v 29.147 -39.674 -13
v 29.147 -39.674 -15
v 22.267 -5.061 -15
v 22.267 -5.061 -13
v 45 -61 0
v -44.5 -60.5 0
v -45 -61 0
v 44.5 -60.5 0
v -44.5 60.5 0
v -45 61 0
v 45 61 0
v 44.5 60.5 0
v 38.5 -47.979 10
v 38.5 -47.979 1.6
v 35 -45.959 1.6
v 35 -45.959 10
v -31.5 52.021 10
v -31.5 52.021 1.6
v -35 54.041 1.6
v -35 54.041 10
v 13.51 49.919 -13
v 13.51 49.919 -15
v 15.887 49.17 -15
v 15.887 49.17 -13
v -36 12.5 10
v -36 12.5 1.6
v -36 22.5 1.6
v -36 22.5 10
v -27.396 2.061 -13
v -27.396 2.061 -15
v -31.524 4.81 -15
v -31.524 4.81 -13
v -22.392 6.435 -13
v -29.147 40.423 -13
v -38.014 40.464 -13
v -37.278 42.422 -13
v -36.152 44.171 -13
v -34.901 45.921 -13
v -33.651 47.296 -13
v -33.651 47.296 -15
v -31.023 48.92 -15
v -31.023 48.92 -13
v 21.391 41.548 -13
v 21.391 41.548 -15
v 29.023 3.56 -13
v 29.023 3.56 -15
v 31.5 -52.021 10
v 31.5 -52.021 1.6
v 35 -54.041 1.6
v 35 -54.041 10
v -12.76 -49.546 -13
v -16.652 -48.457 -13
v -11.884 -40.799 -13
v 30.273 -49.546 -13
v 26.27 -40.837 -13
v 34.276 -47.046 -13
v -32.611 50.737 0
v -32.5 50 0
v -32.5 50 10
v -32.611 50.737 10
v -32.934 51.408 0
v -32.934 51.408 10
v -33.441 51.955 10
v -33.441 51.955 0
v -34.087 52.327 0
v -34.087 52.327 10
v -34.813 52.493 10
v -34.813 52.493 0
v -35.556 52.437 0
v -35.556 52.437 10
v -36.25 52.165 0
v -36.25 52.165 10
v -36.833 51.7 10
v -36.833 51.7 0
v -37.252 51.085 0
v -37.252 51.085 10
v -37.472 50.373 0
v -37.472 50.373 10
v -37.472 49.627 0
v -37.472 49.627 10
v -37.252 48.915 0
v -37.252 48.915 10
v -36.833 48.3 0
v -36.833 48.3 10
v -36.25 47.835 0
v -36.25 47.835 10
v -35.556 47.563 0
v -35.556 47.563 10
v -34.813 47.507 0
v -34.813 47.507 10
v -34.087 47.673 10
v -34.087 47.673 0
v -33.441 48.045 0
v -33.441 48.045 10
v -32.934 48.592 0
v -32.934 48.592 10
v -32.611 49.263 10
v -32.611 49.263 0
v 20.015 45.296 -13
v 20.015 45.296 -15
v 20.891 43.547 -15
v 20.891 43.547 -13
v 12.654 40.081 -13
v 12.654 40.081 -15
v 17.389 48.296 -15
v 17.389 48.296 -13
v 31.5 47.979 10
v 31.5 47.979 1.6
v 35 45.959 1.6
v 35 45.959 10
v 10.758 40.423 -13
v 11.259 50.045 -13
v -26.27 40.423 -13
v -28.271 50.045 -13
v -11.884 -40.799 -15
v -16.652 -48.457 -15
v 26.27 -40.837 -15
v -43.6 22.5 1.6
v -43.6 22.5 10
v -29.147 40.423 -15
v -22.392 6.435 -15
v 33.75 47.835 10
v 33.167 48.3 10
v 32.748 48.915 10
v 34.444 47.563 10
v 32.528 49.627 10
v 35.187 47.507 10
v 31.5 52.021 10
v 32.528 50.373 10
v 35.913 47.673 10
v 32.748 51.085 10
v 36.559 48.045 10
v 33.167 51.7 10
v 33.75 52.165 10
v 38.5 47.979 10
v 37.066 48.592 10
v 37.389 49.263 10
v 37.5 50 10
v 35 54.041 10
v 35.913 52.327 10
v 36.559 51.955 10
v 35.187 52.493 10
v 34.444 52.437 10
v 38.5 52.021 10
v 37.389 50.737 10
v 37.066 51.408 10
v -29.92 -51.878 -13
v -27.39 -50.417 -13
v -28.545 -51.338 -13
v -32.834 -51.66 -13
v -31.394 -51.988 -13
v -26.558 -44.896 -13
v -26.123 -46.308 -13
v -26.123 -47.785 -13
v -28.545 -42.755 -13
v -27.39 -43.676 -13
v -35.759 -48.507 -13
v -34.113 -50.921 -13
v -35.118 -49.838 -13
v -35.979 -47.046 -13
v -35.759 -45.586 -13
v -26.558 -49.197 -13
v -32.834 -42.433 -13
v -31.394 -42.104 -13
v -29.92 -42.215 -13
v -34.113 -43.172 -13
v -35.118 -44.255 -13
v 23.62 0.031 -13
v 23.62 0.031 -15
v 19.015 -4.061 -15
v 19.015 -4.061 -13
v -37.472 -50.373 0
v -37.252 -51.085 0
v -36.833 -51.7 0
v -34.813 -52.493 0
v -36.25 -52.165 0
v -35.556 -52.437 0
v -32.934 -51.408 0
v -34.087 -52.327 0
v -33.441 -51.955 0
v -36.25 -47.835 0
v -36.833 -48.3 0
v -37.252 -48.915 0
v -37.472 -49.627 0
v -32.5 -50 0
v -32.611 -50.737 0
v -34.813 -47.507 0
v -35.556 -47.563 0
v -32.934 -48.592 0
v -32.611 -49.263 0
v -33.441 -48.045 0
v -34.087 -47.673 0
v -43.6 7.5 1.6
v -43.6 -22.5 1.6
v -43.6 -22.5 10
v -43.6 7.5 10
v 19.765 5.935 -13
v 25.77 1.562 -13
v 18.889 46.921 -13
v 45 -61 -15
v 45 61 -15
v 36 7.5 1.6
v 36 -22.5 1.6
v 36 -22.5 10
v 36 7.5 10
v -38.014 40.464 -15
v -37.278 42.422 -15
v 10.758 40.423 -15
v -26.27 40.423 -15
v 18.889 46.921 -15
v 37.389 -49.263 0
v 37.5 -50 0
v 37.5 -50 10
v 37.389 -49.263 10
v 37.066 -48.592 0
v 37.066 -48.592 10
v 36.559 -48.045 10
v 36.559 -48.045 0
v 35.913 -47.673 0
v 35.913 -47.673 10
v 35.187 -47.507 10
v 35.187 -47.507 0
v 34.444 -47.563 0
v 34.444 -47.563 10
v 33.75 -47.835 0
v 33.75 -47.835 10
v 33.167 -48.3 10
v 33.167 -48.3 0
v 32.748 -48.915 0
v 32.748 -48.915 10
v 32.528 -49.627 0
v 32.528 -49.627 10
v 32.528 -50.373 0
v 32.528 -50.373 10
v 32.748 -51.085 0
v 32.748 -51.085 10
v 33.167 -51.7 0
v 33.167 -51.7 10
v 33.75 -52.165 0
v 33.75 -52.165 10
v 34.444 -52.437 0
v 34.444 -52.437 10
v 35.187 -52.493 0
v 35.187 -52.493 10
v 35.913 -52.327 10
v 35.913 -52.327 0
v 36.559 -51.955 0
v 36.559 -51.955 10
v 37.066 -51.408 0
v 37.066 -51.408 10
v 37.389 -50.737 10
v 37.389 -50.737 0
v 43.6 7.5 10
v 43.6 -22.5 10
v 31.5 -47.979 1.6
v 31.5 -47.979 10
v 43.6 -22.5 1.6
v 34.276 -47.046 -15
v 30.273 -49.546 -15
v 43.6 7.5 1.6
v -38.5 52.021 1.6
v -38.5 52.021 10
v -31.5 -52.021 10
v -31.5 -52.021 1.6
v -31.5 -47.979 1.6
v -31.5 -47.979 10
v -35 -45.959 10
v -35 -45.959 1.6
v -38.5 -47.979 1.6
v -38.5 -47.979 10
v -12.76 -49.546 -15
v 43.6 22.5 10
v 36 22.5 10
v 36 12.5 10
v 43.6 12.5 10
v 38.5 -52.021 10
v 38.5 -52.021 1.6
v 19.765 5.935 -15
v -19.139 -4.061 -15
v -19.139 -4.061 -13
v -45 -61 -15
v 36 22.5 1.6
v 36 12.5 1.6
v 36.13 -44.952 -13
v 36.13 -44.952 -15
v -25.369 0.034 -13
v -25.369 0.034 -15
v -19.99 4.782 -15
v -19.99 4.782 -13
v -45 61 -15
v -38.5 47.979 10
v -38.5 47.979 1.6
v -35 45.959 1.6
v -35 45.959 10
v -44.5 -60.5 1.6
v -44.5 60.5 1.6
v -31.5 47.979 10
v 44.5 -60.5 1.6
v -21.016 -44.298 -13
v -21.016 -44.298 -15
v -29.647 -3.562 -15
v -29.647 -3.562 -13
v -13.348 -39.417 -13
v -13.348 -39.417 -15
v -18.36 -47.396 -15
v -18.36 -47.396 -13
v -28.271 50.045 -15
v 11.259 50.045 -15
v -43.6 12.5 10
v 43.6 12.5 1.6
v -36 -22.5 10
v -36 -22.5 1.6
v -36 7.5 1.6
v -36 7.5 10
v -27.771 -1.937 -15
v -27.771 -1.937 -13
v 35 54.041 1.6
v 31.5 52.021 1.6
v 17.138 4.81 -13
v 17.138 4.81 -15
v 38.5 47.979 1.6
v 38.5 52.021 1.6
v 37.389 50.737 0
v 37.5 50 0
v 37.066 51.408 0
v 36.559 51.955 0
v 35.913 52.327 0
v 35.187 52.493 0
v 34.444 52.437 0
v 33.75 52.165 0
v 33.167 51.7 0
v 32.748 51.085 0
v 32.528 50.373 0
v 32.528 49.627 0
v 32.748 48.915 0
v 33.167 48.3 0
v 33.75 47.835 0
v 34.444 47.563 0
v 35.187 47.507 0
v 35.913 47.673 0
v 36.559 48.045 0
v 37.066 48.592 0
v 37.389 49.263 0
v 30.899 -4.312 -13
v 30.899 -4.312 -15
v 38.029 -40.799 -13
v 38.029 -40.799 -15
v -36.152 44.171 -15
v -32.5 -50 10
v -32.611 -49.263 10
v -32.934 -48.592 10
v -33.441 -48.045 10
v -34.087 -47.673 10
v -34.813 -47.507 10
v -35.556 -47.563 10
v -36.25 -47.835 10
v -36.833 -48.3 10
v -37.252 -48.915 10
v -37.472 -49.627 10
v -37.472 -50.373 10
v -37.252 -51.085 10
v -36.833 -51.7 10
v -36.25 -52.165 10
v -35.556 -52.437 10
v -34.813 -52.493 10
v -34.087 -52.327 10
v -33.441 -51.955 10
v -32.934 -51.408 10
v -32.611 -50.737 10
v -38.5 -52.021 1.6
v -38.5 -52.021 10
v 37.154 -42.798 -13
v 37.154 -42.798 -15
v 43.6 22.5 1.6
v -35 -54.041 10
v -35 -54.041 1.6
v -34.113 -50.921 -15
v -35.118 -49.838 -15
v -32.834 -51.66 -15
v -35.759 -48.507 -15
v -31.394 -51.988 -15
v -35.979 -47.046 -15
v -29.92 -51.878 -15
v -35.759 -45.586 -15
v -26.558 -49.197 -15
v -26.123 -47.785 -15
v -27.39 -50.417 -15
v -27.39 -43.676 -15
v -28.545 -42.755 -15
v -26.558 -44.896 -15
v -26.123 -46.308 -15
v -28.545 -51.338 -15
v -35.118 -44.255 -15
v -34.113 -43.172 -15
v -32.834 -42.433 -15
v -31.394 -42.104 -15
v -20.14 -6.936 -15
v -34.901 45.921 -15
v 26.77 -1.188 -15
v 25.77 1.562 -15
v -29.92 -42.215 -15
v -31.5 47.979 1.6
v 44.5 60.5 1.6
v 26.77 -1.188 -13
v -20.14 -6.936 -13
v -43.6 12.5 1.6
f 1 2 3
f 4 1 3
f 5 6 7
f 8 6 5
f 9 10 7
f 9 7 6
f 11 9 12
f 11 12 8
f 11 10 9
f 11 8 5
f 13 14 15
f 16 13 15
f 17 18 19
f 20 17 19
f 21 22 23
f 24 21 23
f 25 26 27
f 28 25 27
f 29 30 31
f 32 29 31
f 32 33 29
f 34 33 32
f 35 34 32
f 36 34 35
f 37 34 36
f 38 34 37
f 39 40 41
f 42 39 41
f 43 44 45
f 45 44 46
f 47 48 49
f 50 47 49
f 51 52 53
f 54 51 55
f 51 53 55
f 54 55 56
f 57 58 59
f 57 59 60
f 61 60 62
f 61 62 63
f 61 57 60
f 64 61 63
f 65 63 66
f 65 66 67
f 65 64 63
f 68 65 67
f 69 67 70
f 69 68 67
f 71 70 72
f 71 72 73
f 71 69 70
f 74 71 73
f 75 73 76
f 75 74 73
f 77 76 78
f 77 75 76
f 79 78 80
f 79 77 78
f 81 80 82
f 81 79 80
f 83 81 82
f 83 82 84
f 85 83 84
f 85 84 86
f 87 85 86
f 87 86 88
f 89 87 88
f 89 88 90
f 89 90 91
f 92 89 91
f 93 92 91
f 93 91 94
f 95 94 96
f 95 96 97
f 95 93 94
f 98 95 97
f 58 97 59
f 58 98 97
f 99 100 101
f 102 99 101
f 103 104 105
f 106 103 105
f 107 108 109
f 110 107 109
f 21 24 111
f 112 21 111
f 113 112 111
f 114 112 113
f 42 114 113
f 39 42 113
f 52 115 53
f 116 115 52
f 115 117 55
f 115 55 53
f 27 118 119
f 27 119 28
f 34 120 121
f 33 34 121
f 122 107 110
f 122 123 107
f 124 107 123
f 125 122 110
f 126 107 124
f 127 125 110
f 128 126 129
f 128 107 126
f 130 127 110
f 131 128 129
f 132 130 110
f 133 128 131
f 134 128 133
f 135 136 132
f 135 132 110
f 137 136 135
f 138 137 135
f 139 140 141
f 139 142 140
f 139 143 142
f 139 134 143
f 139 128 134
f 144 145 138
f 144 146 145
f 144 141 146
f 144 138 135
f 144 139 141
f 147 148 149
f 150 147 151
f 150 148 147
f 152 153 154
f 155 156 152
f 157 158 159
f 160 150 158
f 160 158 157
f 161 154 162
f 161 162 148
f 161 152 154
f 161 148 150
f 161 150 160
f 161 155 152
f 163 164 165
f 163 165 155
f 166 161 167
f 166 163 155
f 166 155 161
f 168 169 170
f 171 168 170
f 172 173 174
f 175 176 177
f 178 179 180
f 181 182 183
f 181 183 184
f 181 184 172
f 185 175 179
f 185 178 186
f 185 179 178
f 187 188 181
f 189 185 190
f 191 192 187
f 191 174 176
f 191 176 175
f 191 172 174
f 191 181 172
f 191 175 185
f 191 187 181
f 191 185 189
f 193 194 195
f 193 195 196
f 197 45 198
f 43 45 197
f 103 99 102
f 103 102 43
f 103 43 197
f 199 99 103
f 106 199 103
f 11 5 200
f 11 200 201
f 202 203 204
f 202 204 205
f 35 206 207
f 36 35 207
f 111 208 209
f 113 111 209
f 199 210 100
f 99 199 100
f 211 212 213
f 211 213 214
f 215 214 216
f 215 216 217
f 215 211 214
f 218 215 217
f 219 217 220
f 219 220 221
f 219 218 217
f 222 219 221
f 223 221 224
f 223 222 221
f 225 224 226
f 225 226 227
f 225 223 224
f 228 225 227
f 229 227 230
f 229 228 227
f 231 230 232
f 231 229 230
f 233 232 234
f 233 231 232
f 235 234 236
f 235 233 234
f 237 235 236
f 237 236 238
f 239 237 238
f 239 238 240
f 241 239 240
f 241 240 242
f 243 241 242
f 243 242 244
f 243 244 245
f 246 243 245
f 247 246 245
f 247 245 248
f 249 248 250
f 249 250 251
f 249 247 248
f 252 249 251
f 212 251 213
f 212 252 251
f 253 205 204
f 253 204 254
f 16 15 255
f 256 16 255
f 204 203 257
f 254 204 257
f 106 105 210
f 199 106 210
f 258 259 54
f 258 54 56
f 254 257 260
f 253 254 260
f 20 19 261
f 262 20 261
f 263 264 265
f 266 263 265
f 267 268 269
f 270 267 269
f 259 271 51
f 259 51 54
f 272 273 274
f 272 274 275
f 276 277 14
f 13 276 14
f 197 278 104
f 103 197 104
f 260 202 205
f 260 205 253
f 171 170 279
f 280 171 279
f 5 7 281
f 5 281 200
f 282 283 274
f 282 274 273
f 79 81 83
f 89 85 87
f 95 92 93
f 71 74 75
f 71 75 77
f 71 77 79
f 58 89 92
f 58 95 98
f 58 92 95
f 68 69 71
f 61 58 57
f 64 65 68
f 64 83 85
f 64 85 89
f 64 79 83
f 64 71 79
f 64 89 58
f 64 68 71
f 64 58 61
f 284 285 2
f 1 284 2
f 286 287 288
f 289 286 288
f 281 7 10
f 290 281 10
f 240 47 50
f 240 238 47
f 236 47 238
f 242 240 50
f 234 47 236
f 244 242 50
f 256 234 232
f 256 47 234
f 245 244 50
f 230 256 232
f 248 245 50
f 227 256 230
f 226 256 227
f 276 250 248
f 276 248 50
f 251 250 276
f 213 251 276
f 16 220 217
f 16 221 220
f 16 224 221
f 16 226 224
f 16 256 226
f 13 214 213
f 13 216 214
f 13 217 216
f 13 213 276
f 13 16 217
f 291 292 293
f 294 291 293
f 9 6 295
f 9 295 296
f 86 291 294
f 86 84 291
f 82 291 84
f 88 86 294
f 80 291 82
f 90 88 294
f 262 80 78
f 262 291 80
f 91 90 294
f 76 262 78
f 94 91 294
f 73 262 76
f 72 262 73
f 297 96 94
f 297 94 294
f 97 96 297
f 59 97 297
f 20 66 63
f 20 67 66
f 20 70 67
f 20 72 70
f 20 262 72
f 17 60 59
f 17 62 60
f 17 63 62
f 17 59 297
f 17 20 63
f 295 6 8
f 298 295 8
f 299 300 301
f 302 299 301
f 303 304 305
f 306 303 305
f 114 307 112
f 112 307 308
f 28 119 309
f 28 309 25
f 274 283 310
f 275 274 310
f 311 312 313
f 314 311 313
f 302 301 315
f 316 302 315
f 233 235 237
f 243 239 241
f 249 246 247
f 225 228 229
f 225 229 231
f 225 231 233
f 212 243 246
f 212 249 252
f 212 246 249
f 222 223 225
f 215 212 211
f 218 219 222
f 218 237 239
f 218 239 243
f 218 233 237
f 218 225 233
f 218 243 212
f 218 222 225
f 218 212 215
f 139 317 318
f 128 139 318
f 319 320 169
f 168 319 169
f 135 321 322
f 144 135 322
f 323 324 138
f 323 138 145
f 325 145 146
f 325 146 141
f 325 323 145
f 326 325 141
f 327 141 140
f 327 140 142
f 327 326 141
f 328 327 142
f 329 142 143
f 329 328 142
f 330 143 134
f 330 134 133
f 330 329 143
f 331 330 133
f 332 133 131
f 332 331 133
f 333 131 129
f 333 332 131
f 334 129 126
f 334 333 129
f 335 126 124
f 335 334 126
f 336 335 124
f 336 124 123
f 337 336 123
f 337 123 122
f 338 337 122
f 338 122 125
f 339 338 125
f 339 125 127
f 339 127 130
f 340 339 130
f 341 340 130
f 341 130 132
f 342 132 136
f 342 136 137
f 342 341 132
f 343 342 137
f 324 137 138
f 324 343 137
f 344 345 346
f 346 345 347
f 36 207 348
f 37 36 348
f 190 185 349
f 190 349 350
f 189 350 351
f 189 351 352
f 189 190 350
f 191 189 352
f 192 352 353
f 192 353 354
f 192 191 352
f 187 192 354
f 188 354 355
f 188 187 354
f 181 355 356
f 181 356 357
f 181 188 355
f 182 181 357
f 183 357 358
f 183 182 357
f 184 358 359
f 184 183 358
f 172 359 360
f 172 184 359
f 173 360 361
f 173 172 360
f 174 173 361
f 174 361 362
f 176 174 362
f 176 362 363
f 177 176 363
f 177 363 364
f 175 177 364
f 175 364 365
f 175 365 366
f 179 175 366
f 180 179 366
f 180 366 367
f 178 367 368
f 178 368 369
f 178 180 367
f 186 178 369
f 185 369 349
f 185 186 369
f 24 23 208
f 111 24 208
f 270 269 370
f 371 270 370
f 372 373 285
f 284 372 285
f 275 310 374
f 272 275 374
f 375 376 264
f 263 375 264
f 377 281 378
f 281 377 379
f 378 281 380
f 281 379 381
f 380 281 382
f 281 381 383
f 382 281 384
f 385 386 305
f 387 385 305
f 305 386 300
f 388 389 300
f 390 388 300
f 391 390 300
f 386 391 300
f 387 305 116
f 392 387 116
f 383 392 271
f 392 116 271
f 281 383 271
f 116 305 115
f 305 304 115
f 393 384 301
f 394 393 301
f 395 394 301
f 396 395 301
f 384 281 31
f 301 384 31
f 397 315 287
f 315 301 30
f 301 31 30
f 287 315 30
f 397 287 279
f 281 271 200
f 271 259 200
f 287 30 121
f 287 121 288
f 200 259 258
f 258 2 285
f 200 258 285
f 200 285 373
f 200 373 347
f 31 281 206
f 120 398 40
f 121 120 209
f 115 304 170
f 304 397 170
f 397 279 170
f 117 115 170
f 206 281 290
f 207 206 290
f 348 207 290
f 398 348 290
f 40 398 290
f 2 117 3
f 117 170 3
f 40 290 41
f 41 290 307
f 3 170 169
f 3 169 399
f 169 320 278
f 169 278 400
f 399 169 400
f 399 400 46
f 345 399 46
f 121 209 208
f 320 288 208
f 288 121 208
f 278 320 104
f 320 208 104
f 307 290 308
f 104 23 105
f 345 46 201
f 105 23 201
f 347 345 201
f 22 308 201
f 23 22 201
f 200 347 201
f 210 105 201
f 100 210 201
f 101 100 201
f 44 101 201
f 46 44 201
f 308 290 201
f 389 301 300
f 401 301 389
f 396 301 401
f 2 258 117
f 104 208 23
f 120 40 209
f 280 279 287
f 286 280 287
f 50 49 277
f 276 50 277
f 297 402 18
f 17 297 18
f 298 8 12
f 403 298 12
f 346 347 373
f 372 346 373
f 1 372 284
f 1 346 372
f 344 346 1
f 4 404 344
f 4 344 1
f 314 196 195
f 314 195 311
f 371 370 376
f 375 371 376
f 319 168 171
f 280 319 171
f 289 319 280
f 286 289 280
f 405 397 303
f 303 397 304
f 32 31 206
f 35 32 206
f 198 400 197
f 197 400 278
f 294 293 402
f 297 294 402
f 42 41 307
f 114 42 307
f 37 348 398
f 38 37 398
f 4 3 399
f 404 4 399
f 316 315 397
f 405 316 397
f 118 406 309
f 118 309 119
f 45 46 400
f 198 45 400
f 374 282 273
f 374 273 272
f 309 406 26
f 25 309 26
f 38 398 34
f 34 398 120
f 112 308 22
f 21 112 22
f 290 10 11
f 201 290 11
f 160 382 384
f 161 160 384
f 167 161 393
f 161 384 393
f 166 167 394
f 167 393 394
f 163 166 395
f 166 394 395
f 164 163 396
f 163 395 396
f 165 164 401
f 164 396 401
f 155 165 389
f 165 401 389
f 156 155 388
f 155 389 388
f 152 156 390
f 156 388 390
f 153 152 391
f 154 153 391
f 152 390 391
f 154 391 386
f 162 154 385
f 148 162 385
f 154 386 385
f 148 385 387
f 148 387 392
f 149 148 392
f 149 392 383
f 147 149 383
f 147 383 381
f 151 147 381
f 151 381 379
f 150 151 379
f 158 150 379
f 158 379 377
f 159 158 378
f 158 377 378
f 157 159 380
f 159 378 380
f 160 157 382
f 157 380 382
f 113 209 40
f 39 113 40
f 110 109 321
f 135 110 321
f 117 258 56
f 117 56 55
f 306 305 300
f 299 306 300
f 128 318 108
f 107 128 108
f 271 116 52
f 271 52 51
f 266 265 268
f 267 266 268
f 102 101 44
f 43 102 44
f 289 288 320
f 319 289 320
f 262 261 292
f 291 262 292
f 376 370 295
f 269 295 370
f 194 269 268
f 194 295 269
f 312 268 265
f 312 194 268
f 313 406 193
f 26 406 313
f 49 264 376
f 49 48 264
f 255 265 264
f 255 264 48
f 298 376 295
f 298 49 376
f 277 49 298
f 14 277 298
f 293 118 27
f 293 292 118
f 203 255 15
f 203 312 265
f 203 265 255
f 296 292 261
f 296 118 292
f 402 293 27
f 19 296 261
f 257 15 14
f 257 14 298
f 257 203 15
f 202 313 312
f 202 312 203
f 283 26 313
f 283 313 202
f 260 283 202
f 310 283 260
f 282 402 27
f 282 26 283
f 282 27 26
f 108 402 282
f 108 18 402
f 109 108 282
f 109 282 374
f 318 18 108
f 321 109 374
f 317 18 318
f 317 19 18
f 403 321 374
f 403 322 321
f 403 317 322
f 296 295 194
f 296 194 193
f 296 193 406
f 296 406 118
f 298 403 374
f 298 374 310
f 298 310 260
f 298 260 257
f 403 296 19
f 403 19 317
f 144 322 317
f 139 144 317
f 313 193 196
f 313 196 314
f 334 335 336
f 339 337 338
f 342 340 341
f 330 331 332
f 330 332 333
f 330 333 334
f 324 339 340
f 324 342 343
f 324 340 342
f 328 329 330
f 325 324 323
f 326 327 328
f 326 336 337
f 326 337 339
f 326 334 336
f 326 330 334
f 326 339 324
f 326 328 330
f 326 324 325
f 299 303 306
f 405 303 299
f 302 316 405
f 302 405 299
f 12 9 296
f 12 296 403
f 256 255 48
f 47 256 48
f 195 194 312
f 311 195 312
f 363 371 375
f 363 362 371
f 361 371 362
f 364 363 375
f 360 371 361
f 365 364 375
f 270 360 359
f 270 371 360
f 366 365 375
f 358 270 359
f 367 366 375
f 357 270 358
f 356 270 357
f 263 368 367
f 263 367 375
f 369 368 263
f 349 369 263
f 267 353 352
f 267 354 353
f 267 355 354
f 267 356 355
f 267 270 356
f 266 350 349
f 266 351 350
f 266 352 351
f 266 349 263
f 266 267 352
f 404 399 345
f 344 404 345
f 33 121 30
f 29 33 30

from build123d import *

# Parameters (mm, degrees)
MODEL_W             = 90
MODEL_H             = 122
BOSS_EXTRUDE1_DEPTH = 15
MODEL_3_W           = 89
MODEL_3_H           = 121
BOSS_EXTRUDE2_DEPTH = 1.6
BOSS_EXTRUDE3_DEPTH = 10
MODEL_5_W           = 7.6
MODEL_5_H           = 10
BOSS_EXTRUDE4_DEPTH = 10
MODEL_6_W           = 7.6
MODEL_6_H           = 30
BOSS_EXTRUDE5_DEPTH = 10
MODEL_7_R           = 2.5
CUT_EXTRUDE1_DEPTH  = 10
SKETCH4_R           = 4.955800122
CUT_EXTRUDE2_DEPTH  = 2


with BuildPart() as part:
    # Model → Boss-Extrude1 (new body)
    with BuildSketch(Plane.XY):
        Rectangle(MODEL_W, MODEL_H)
    extrude(amount=-BOSS_EXTRUDE1_DEPTH)

    # Model<3> → Boss-Extrude2 (add)
    with BuildSketch(Plane.XY):
        Rectangle(MODEL_3_W, MODEL_3_H)
    extrude(amount=BOSS_EXTRUDE2_DEPTH)

    # Model<4> → Boss-Extrude3 (add)
    with BuildSketch(Plane.XY):
        Polygon((-35, 45.958548116), (-31.5, 47.979274058), (-31.5, 52.020725942), (-35, 54.041451884), (-38.5, 52.020725942), (-38.5, 47.979274058), align=None)
        Polygon((35, 45.958548116), (38.5, 47.979274058), (38.5, 52.020725942), (35, 54.041451884), (31.5, 52.020725942), (31.5, 47.979274058), align=None)
        Polygon((35, -45.958548116), (31.5, -47.979274058), (31.5, -52.020725942), (35, -54.041451884), (38.5, -52.020725942), (38.5, -47.979274058), align=None)
        Polygon((-35, -45.958548116), (-38.5, -47.979274058), (-38.5, -52.020725942), (-35, -54.041451884), (-31.5, -52.020725942), (-31.5, -47.979274058), align=None)
    extrude(amount=BOSS_EXTRUDE3_DEPTH)

    # Model<5> → Boss-Extrude4 (add)
    with BuildSketch(Plane.XY):
        with Locations((-39.8, 17.5)):
            Rectangle(MODEL_5_W, MODEL_5_H)
        with Locations((39.8, 17.5)):
            Rectangle(MODEL_5_W, MODEL_5_H)
    extrude(amount=BOSS_EXTRUDE4_DEPTH)

    # Model<6> → Boss-Extrude5 (add)
    with BuildSketch(Plane.XY):
        with Locations((-39.8, -7.5)):
            Rectangle(MODEL_6_W, MODEL_6_H)
        with Locations((39.8, -7.5)):
            Rectangle(MODEL_6_W, MODEL_6_H)
    extrude(amount=BOSS_EXTRUDE5_DEPTH)

    # Model<7> → Cut-Extrude1 (cut)
    with BuildSketch(Plane.XY):
        with Locations((-35, 50)):
            Circle(MODEL_7_R)
        with Locations((35, 50)):
            Circle(MODEL_7_R)
        with Locations((-35, -50)):
            Circle(MODEL_7_R)
        with Locations((35, -50)):
            Circle(MODEL_7_R)
    extrude(amount=CUT_EXTRUDE1_DEPTH, mode=Mode.SUBTRACT)

    # Sketch4 → Cut-Extrude2 (cut)
    with BuildSketch(Plane(origin=(0, 0, -15), x_dir=(-1, 0, 0), z_dir=(0, 0, -1))):
        Polygon((19.1392, -4.0613), (25.369, 0.0335), (19.9902, 4.7816), (0, 4.796944772), (-17.1378, 4.8101), (-23.6203, 0.0312), (-19.0147, -4.0613), align=None)
        Polygon((-10.7582, 40.4232), (26.2696, 40.4232), (33.6508, 47.2956), (31.0232, 48.9196), (28.271, 50.0448), (-11.259, 50.0448), (-13.5104, 49.9194), (-15.8871, 49.1702), align=None)
        Polygon((-38.029, -40.7988), (-37.1536, -42.7978), (-36.13, -44.9525), (-29.1472, -39.6744), (-22.2668, -5.0611), (-26.7704, -1.1876), (-30.8986, -4.3118), align=None)
        Polygon((-25.7696, 1.5615), (-19.7654, 5.9353), (-12.654031371, 40.081219045), (-17.3886, 48.2956), (-18.8893, 46.9206), (-20.0154, 45.2958), (-20.8906, 43.5466), (-21.3914, 41.5476), (-29.0226, 3.56045), align=None)
        Polygon((29.1472, 40.4232), (22.3922, 6.4348), (27.3956, 2.061), (31.5238, 4.8101), (38.013524934, 40.463880597), (37.2782, 42.4222), (36.152, 44.1714), (34.9014, 45.9206), align=None)
        Polygon((27.771, -1.937), (20.14, -6.9356), (13.3477, -39.4168), (18.3604, -47.3956), (21.016, -44.298), (29.647, -3.5617), align=None)
        Polygon((-30.2732, -49.5456), (12.7596, -49.5456), (16.652, -48.4566), (11.8843, -40.7988), (-26.2704, -40.8369), (-34.276, -47.0464), align=None)
        with Locations((31.0232, -47.0464)):
            Circle(SKETCH4_R)
    extrude(amount=-CUT_EXTRUDE2_DEPTH, mode=Mode.SUBTRACT)


solid = part.part
